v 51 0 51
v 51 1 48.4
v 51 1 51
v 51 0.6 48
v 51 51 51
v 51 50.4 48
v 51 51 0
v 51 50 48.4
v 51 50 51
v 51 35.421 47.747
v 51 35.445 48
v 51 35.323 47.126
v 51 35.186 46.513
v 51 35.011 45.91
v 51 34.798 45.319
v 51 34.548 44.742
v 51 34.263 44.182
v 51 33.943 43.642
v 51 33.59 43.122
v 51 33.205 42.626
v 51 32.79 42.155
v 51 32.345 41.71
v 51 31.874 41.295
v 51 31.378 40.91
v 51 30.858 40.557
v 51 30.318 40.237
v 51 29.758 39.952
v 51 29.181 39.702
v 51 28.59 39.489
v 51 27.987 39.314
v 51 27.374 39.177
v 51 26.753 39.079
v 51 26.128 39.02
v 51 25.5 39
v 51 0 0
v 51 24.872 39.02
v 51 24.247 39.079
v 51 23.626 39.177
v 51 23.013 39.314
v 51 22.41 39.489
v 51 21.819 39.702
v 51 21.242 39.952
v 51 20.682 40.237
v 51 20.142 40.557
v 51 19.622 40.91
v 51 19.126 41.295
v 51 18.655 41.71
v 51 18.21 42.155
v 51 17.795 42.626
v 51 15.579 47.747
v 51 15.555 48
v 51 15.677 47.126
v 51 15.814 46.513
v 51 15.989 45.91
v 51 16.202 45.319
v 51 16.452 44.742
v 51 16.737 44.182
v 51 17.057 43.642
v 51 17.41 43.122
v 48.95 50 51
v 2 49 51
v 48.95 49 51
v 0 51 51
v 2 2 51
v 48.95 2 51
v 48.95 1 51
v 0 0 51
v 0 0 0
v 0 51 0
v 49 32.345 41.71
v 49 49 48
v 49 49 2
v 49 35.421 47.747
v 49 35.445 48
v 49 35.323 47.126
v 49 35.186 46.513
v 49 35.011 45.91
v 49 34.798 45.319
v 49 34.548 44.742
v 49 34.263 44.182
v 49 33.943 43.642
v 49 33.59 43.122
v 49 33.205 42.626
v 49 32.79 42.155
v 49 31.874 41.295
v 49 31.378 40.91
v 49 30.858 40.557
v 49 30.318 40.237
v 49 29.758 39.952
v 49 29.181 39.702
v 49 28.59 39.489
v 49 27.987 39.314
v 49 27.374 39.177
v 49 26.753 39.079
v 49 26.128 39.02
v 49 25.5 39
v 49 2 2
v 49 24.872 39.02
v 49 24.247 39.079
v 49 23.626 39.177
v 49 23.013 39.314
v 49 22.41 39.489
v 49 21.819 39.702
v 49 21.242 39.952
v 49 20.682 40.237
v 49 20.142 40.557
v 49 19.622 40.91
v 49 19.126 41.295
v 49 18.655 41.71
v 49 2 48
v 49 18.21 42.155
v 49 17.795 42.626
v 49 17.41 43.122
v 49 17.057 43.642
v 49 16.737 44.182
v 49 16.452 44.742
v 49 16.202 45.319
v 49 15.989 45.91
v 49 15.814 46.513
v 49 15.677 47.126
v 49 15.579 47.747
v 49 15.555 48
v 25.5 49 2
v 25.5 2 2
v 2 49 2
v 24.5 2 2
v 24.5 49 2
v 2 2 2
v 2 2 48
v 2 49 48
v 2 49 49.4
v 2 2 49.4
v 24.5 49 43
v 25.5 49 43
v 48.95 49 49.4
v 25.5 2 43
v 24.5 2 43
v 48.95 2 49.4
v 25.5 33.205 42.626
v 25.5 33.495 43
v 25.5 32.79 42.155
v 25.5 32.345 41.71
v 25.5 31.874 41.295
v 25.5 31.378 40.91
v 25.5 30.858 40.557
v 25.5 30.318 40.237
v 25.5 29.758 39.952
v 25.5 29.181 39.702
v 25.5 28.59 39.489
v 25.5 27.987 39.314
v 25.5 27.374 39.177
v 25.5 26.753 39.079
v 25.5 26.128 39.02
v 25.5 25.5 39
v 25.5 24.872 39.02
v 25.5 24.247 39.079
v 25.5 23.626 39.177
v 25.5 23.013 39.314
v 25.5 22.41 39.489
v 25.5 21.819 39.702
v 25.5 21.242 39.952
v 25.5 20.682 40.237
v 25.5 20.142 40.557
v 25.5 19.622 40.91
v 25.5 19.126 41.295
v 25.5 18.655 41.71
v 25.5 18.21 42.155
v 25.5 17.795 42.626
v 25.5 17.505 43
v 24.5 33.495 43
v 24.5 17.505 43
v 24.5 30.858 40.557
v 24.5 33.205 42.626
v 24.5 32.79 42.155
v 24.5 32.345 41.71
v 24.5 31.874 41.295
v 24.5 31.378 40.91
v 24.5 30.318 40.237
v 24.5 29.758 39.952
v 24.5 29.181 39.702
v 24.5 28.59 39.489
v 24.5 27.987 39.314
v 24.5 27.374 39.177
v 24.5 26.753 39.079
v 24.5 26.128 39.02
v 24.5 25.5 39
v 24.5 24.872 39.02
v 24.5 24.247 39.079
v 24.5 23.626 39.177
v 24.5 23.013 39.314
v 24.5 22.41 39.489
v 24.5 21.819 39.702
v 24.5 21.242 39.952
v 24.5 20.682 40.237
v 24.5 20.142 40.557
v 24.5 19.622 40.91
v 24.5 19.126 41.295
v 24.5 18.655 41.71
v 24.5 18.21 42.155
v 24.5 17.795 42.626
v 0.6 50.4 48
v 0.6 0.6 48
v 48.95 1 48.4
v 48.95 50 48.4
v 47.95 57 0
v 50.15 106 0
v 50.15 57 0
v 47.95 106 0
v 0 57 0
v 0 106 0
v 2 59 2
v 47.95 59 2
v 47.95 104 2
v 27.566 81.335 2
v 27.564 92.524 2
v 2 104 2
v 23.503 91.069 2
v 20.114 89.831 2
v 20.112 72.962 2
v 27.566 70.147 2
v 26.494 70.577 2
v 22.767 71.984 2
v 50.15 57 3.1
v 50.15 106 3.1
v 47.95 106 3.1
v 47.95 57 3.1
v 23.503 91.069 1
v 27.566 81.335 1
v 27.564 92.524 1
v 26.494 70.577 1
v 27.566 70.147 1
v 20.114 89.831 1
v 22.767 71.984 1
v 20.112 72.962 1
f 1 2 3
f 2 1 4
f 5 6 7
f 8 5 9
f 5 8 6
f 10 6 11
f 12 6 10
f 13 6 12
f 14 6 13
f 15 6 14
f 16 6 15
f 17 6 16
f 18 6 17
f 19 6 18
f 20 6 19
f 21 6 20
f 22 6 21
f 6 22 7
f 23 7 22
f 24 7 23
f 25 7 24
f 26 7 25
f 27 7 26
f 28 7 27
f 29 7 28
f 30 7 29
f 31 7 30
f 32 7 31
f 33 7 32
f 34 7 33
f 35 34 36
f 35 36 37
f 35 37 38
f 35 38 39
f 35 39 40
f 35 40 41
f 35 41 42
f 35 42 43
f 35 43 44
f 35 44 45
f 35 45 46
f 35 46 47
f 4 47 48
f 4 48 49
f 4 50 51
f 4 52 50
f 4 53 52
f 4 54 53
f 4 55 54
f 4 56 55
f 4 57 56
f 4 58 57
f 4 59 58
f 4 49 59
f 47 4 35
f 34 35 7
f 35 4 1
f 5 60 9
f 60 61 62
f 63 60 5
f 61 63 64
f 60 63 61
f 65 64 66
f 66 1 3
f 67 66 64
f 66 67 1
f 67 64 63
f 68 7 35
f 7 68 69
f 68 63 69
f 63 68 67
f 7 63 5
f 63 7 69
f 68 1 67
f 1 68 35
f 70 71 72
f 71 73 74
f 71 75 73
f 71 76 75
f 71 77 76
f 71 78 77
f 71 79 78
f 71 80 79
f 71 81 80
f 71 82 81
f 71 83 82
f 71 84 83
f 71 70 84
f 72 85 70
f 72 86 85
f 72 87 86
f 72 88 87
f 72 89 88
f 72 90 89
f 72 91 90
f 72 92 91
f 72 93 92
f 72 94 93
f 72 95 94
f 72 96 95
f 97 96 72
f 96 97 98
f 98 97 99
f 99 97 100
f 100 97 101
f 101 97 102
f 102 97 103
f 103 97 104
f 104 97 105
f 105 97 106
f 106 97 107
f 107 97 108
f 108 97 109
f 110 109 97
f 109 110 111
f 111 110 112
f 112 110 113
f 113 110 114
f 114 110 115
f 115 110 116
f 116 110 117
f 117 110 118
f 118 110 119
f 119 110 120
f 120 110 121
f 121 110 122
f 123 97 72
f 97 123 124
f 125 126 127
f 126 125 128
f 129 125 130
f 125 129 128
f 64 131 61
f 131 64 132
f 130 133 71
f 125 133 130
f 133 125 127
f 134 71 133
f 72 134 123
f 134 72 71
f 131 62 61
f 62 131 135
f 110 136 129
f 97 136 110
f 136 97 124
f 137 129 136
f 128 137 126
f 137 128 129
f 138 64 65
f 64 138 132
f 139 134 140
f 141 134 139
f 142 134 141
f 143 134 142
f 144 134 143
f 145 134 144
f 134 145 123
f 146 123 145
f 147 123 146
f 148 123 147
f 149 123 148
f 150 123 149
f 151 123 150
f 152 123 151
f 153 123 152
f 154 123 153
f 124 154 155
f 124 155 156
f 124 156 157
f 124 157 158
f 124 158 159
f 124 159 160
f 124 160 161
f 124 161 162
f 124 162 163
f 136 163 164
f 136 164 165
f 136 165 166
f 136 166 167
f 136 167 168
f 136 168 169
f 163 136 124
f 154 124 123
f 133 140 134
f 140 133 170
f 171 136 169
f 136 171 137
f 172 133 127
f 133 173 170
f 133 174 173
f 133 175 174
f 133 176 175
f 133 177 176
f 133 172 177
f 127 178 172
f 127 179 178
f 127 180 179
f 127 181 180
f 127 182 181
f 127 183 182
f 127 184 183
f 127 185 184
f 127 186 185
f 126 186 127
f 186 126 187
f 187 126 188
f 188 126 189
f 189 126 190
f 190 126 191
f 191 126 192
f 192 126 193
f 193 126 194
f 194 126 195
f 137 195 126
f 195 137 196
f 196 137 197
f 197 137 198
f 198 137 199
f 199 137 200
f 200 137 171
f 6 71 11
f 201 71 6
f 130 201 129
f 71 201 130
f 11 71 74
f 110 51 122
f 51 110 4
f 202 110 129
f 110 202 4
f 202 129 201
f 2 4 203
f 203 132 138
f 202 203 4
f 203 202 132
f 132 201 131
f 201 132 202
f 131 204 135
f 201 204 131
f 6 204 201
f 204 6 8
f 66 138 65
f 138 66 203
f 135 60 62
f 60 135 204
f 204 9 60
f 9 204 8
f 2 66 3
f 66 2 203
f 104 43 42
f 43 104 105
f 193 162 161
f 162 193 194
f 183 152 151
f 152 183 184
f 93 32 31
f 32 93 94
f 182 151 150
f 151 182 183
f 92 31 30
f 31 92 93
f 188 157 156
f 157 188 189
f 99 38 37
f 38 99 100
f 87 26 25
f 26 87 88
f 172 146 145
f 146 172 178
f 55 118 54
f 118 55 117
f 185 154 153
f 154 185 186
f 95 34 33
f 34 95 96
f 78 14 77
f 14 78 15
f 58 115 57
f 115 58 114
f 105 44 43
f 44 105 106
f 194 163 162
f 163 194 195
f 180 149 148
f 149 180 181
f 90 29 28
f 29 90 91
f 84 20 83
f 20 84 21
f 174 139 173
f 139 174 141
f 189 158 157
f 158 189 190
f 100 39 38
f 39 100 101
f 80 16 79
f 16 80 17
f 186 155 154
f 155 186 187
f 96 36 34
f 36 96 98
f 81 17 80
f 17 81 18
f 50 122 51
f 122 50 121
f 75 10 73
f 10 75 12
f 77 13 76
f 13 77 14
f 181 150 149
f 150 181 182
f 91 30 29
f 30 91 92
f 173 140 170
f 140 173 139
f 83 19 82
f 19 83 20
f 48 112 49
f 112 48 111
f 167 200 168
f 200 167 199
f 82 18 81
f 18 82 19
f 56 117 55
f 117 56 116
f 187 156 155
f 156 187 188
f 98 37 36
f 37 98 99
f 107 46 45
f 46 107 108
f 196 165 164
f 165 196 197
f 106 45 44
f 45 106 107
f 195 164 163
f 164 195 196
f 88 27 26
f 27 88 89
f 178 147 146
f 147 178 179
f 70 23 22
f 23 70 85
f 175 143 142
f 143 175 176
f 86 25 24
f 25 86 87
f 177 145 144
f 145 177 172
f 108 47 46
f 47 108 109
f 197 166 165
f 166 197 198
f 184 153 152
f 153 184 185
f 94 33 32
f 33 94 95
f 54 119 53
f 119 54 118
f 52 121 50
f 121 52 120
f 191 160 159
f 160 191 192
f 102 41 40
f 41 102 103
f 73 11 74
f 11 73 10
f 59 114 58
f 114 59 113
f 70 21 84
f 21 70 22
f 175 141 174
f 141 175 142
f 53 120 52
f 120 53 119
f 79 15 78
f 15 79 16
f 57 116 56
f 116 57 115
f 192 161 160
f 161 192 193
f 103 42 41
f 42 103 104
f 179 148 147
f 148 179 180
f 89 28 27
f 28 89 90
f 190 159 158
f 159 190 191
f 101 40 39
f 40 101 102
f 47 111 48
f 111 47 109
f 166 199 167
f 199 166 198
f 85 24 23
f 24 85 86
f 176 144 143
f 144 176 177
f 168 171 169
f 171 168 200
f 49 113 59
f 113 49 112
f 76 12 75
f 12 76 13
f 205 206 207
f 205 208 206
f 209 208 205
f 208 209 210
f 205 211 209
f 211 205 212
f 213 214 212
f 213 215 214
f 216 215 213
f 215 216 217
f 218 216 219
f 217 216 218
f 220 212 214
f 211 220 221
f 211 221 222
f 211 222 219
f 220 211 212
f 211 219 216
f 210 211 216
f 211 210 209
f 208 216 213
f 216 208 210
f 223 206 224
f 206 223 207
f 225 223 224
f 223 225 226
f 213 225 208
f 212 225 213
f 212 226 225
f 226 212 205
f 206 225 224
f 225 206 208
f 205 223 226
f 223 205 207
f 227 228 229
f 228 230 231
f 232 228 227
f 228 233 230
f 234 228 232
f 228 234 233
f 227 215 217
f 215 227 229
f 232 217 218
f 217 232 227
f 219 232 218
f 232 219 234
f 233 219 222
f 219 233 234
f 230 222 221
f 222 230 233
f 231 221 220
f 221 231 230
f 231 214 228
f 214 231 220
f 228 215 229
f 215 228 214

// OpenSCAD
// file: carcassonne_box.scad
/**
 * @file carcassonne_box.scad
 * @author Conlan Wesson
 * Template for Carcossonne boxes.
 * @copyright Creative Commons Attribution-NonCommercial-ShareAlike 4.0
 */

mm = 1;
cm = 10*mm;

width = 47*mm;
thick = 2.5*mm;
wall = 2*mm;

/**
 * Lid for box.
 * @param count Number of cards.
 * @param columns Number of columns.
 * @param icon Path to icon DXF file.
 * @param rot Icon rotation in degrees.
 * @param mult Icon scale.
 * @param xoff X-offset of icon from center.
 * @param yoff Y-offset of icon from center.
 */
module carcassonne_lid(count, columns=1, icon=false, rot=0, mult=1, xoff=0, yoff=0, g=0){
	length = (thick * count) + ((width/2) - ((thick * count) % (width/2)));
	w = length+(1.5*wall)+.1;
	l = (width*columns)+wall;
	h = wall;
	d = 2;

	CubePoints = [
		[ 0-g, 0-g,   0 ],  //0
		[ w+g, 0-g,   0 ],  //1
		[ w+g, l+g,   0 ],  //2
		[ 0-g, l+g,   0 ],  //3
		[   d,   d, h+g ],  //4
		[   w,   d, h+g ],  //5
		[   w, l-d, h+g ],  //6
		[   d, l-d, h+g ]   //7
	];
	
	CubeFaces = [
		[0,1,2,3],  // bottom
		[4,5,1,0],  // front
		[7,6,5,4],  // top
		[5,6,2,1],  // right
		[6,7,3,2],  // back
		[7,4,0,3]   // left
	];
	
	
	difference(){
		union(){
			polyhedron( CubePoints, CubeFaces );
			translate([w-wall-.15,0,0]) cube([wall+.2,l, (1.5*wall)+.1]);
		}
		if(icon){
			translate([w/2+xoff,l/3+yoff,h-(wall/2)]){
				linear_extrude(height=(wall)+.1){
					rotate(rot) scale(mult) import(icon);
				}
			}
		}
	}
}

/**
 * Carcassonne card box.
 * @param count Number of cards.
 * @param dividers Array of divider positions.
 * @param columns Number of columns.
 */
module carcassonne_box(count, dividers=[], columns=1){
	length = (thick * count) + ((width/2) - ((thick * count) % (width/2)));
	difference(){
		union(){
			difference(){
				// Outer walls
				cube([length+(2*wall), (width*columns)+(2*wall), width+(2*wall)]);
				// Cavity
				translate([wall, wall, wall]){
					cube([length, width*columns, (width+wall)+.1]);
				}
			}
			// Dividers
			for(col = [0:columns-1]){
				for(div = dividers[col]){
					translate([(div*(width/2))+(wall/2), width*col+wall, 0]) cube([wall/2, width, width-(2*wall)]);
				}
				if(col > 0){
					translate([0, width*col+(wall/2), 0]) cube([length+(2*wall), wall/2, width-(2*wall)]);
				}
			}
		}
		union(){
			// Notch
			for(col = [0:columns-1]){
				translate([wall, wall+(width*col), wall]){
					translate([0, width/2, width])
					rotate([0, 90, 0]){
						cylinder(r=10, h=length+(2*wall), $fn=100);
					}
				}
			}
			// Track
			translate([wall/2,wall/2,width+wall/2]) carcassonne_lid(count, columns, g=0.4);
		}
	}
}
// main file
/**
 * @file goldmines.scad
 * @author Conlan Wesson
 * The Gold Mines Carcossonne box.
 * @copyright Creative Commons Attribution-NonCommercial-ShareAlike 4.0
 */

include <carcassonne_box.scad>

count = 16;
dividers = [[1]];
columns = 1;

carcassonne_box(count, dividers, columns);
translate([0,width*columns+10,0]) carcassonne_lid(count, columns, icon="goldmines.dxf", rot=90, mult=0.6, xoff=5, yoff=-5);
